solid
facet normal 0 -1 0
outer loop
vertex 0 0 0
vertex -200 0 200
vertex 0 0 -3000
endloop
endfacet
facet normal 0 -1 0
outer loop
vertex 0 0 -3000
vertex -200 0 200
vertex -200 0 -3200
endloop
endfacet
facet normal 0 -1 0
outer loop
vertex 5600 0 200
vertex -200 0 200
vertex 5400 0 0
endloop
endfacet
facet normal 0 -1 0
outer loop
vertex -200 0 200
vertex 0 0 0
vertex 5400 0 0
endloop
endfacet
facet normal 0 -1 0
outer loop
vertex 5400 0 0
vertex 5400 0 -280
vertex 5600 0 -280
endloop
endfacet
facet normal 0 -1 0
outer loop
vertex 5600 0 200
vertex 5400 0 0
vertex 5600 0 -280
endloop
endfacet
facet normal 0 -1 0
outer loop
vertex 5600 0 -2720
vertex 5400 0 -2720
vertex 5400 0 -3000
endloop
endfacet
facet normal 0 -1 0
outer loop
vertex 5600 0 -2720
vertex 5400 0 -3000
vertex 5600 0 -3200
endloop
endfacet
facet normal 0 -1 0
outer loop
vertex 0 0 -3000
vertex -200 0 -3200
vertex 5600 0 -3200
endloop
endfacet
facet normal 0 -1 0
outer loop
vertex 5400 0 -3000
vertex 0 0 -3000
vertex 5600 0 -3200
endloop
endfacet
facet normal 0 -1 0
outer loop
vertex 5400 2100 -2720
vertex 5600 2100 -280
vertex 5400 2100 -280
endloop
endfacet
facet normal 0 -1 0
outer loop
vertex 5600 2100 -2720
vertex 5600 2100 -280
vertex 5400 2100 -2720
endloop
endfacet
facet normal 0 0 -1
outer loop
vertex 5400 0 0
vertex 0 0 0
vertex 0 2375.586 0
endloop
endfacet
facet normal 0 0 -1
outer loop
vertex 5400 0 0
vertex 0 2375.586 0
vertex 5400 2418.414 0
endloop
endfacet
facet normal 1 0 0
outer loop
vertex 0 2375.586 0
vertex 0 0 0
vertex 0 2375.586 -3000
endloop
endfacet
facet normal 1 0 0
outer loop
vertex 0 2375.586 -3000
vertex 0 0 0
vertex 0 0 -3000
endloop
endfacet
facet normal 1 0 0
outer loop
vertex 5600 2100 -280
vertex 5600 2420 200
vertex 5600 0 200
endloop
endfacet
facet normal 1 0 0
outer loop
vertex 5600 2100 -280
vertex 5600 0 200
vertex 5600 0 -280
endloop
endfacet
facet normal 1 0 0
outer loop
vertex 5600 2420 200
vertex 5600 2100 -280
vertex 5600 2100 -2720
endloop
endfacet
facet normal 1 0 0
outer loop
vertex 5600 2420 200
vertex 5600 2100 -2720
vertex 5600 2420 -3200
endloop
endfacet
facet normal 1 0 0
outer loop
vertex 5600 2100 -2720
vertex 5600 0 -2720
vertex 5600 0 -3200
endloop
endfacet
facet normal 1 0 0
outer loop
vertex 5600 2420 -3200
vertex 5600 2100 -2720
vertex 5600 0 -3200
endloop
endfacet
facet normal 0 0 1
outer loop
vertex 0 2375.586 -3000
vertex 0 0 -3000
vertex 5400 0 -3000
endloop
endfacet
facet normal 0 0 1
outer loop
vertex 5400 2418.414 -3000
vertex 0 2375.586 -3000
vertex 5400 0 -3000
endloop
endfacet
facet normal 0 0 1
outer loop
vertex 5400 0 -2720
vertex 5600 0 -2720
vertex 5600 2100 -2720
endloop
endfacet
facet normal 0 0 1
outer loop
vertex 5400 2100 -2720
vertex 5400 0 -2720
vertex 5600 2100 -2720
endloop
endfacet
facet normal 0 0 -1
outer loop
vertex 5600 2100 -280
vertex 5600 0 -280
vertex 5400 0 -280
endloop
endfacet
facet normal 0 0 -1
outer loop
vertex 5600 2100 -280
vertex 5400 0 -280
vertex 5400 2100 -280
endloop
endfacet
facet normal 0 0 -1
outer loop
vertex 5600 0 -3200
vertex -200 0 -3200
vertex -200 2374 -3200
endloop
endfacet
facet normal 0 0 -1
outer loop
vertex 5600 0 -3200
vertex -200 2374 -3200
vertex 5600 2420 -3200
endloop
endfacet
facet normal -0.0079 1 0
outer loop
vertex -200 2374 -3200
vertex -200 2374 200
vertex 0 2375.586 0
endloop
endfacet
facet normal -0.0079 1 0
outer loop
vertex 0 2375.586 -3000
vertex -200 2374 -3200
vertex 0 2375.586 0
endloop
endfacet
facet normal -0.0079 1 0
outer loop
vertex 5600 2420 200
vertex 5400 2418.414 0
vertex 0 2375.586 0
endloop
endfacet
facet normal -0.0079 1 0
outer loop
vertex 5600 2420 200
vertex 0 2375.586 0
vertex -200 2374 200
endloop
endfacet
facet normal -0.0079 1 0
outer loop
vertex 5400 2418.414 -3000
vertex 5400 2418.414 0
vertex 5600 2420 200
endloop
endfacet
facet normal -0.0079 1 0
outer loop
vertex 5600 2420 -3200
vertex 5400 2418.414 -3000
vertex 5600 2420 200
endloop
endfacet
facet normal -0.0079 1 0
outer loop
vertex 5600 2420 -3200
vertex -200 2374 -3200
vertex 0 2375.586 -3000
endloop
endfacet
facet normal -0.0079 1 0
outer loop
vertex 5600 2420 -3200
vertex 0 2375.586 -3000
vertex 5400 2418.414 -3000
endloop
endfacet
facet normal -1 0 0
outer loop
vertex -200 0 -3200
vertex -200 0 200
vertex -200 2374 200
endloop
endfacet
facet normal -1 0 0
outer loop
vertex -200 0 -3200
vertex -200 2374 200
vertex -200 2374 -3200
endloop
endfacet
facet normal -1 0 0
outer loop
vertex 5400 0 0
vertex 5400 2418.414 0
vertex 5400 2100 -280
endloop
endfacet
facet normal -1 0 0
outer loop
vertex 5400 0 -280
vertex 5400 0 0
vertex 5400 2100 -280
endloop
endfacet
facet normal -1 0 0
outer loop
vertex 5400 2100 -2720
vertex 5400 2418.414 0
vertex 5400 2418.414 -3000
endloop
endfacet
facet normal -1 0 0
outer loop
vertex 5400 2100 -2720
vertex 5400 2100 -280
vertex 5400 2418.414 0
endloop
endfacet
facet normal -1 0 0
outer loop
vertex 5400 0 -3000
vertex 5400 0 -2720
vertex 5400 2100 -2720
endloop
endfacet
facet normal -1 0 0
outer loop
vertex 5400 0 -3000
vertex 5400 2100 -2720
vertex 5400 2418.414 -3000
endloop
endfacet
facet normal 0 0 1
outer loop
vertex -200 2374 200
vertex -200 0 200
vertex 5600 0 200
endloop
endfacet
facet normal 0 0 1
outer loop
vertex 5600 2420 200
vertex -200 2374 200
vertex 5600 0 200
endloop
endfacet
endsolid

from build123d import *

# Parameters (mm, degrees)
SKETCH_1_W          = 5800
SKETCH_1_H          = 3400
SKETCH_1_W_2        = 5400
SKETCH_1_H_2        = 3000
EXTRUDE_1_DEPTH     = 2420
CUT_EXTRUDE_1_REACH = 5802
SKETCH_2_W          = 2440
SKETCH_2_H          = 2100
CUT_EXTRUDE_2_DEPTH = 3401


with BuildPart() as part:
    # Эскиз1 → Вытянуть-Тонкостенный1 (new body)
    with BuildSketch(Plane(origin=(0, 0, 0), x_dir=(1, 0, 0), z_dir=(0, 1, 0))):
        with Locations((2700, 1500)):
            Rectangle(SKETCH_1_W, SKETCH_1_H)
        with Locations((2700, 1500)):
            Rectangle(SKETCH_1_W_2, SKETCH_1_H_2, mode=Mode.SUBTRACT)
    extrude(amount=EXTRUDE_1_DEPTH)

    # Эскиз2 → Вырез-Вытянуть1 (cut, up to next)
    with BuildSketch(Plane(origin=(5600, 0, 0), x_dir=(0, 0, -1), z_dir=(1, 0, 0)), mode=Mode.PRIVATE) as cut_extrude_1_sk1:
        with Locations((1500, 1050)):
            Rectangle(SKETCH_2_W, SKETCH_2_H)
    cut_extrude_1_tool1 = extrude(cut_extrude_1_sk1.sketch, amount=-CUT_EXTRUDE_1_REACH, mode=Mode.PRIVATE) & part.part
    add(cut_extrude_1_tool1.solids().sort_by_distance((5600, 1050, -1500))[0], mode=Mode.SUBTRACT)

    # Эскиз3 → Вырез-Вытянуть2 (cut, through all)
    with BuildSketch(Plane(origin=(0, 0, -3200), x_dir=(-1, 0, 0), z_dir=(0, 0, -1))):
        Polygon((-5600, 2420), (200, 2420), (200, 2374), align=None)
    extrude(amount=-CUT_EXTRUDE_2_DEPTH, mode=Mode.SUBTRACT)


solid = part.part
